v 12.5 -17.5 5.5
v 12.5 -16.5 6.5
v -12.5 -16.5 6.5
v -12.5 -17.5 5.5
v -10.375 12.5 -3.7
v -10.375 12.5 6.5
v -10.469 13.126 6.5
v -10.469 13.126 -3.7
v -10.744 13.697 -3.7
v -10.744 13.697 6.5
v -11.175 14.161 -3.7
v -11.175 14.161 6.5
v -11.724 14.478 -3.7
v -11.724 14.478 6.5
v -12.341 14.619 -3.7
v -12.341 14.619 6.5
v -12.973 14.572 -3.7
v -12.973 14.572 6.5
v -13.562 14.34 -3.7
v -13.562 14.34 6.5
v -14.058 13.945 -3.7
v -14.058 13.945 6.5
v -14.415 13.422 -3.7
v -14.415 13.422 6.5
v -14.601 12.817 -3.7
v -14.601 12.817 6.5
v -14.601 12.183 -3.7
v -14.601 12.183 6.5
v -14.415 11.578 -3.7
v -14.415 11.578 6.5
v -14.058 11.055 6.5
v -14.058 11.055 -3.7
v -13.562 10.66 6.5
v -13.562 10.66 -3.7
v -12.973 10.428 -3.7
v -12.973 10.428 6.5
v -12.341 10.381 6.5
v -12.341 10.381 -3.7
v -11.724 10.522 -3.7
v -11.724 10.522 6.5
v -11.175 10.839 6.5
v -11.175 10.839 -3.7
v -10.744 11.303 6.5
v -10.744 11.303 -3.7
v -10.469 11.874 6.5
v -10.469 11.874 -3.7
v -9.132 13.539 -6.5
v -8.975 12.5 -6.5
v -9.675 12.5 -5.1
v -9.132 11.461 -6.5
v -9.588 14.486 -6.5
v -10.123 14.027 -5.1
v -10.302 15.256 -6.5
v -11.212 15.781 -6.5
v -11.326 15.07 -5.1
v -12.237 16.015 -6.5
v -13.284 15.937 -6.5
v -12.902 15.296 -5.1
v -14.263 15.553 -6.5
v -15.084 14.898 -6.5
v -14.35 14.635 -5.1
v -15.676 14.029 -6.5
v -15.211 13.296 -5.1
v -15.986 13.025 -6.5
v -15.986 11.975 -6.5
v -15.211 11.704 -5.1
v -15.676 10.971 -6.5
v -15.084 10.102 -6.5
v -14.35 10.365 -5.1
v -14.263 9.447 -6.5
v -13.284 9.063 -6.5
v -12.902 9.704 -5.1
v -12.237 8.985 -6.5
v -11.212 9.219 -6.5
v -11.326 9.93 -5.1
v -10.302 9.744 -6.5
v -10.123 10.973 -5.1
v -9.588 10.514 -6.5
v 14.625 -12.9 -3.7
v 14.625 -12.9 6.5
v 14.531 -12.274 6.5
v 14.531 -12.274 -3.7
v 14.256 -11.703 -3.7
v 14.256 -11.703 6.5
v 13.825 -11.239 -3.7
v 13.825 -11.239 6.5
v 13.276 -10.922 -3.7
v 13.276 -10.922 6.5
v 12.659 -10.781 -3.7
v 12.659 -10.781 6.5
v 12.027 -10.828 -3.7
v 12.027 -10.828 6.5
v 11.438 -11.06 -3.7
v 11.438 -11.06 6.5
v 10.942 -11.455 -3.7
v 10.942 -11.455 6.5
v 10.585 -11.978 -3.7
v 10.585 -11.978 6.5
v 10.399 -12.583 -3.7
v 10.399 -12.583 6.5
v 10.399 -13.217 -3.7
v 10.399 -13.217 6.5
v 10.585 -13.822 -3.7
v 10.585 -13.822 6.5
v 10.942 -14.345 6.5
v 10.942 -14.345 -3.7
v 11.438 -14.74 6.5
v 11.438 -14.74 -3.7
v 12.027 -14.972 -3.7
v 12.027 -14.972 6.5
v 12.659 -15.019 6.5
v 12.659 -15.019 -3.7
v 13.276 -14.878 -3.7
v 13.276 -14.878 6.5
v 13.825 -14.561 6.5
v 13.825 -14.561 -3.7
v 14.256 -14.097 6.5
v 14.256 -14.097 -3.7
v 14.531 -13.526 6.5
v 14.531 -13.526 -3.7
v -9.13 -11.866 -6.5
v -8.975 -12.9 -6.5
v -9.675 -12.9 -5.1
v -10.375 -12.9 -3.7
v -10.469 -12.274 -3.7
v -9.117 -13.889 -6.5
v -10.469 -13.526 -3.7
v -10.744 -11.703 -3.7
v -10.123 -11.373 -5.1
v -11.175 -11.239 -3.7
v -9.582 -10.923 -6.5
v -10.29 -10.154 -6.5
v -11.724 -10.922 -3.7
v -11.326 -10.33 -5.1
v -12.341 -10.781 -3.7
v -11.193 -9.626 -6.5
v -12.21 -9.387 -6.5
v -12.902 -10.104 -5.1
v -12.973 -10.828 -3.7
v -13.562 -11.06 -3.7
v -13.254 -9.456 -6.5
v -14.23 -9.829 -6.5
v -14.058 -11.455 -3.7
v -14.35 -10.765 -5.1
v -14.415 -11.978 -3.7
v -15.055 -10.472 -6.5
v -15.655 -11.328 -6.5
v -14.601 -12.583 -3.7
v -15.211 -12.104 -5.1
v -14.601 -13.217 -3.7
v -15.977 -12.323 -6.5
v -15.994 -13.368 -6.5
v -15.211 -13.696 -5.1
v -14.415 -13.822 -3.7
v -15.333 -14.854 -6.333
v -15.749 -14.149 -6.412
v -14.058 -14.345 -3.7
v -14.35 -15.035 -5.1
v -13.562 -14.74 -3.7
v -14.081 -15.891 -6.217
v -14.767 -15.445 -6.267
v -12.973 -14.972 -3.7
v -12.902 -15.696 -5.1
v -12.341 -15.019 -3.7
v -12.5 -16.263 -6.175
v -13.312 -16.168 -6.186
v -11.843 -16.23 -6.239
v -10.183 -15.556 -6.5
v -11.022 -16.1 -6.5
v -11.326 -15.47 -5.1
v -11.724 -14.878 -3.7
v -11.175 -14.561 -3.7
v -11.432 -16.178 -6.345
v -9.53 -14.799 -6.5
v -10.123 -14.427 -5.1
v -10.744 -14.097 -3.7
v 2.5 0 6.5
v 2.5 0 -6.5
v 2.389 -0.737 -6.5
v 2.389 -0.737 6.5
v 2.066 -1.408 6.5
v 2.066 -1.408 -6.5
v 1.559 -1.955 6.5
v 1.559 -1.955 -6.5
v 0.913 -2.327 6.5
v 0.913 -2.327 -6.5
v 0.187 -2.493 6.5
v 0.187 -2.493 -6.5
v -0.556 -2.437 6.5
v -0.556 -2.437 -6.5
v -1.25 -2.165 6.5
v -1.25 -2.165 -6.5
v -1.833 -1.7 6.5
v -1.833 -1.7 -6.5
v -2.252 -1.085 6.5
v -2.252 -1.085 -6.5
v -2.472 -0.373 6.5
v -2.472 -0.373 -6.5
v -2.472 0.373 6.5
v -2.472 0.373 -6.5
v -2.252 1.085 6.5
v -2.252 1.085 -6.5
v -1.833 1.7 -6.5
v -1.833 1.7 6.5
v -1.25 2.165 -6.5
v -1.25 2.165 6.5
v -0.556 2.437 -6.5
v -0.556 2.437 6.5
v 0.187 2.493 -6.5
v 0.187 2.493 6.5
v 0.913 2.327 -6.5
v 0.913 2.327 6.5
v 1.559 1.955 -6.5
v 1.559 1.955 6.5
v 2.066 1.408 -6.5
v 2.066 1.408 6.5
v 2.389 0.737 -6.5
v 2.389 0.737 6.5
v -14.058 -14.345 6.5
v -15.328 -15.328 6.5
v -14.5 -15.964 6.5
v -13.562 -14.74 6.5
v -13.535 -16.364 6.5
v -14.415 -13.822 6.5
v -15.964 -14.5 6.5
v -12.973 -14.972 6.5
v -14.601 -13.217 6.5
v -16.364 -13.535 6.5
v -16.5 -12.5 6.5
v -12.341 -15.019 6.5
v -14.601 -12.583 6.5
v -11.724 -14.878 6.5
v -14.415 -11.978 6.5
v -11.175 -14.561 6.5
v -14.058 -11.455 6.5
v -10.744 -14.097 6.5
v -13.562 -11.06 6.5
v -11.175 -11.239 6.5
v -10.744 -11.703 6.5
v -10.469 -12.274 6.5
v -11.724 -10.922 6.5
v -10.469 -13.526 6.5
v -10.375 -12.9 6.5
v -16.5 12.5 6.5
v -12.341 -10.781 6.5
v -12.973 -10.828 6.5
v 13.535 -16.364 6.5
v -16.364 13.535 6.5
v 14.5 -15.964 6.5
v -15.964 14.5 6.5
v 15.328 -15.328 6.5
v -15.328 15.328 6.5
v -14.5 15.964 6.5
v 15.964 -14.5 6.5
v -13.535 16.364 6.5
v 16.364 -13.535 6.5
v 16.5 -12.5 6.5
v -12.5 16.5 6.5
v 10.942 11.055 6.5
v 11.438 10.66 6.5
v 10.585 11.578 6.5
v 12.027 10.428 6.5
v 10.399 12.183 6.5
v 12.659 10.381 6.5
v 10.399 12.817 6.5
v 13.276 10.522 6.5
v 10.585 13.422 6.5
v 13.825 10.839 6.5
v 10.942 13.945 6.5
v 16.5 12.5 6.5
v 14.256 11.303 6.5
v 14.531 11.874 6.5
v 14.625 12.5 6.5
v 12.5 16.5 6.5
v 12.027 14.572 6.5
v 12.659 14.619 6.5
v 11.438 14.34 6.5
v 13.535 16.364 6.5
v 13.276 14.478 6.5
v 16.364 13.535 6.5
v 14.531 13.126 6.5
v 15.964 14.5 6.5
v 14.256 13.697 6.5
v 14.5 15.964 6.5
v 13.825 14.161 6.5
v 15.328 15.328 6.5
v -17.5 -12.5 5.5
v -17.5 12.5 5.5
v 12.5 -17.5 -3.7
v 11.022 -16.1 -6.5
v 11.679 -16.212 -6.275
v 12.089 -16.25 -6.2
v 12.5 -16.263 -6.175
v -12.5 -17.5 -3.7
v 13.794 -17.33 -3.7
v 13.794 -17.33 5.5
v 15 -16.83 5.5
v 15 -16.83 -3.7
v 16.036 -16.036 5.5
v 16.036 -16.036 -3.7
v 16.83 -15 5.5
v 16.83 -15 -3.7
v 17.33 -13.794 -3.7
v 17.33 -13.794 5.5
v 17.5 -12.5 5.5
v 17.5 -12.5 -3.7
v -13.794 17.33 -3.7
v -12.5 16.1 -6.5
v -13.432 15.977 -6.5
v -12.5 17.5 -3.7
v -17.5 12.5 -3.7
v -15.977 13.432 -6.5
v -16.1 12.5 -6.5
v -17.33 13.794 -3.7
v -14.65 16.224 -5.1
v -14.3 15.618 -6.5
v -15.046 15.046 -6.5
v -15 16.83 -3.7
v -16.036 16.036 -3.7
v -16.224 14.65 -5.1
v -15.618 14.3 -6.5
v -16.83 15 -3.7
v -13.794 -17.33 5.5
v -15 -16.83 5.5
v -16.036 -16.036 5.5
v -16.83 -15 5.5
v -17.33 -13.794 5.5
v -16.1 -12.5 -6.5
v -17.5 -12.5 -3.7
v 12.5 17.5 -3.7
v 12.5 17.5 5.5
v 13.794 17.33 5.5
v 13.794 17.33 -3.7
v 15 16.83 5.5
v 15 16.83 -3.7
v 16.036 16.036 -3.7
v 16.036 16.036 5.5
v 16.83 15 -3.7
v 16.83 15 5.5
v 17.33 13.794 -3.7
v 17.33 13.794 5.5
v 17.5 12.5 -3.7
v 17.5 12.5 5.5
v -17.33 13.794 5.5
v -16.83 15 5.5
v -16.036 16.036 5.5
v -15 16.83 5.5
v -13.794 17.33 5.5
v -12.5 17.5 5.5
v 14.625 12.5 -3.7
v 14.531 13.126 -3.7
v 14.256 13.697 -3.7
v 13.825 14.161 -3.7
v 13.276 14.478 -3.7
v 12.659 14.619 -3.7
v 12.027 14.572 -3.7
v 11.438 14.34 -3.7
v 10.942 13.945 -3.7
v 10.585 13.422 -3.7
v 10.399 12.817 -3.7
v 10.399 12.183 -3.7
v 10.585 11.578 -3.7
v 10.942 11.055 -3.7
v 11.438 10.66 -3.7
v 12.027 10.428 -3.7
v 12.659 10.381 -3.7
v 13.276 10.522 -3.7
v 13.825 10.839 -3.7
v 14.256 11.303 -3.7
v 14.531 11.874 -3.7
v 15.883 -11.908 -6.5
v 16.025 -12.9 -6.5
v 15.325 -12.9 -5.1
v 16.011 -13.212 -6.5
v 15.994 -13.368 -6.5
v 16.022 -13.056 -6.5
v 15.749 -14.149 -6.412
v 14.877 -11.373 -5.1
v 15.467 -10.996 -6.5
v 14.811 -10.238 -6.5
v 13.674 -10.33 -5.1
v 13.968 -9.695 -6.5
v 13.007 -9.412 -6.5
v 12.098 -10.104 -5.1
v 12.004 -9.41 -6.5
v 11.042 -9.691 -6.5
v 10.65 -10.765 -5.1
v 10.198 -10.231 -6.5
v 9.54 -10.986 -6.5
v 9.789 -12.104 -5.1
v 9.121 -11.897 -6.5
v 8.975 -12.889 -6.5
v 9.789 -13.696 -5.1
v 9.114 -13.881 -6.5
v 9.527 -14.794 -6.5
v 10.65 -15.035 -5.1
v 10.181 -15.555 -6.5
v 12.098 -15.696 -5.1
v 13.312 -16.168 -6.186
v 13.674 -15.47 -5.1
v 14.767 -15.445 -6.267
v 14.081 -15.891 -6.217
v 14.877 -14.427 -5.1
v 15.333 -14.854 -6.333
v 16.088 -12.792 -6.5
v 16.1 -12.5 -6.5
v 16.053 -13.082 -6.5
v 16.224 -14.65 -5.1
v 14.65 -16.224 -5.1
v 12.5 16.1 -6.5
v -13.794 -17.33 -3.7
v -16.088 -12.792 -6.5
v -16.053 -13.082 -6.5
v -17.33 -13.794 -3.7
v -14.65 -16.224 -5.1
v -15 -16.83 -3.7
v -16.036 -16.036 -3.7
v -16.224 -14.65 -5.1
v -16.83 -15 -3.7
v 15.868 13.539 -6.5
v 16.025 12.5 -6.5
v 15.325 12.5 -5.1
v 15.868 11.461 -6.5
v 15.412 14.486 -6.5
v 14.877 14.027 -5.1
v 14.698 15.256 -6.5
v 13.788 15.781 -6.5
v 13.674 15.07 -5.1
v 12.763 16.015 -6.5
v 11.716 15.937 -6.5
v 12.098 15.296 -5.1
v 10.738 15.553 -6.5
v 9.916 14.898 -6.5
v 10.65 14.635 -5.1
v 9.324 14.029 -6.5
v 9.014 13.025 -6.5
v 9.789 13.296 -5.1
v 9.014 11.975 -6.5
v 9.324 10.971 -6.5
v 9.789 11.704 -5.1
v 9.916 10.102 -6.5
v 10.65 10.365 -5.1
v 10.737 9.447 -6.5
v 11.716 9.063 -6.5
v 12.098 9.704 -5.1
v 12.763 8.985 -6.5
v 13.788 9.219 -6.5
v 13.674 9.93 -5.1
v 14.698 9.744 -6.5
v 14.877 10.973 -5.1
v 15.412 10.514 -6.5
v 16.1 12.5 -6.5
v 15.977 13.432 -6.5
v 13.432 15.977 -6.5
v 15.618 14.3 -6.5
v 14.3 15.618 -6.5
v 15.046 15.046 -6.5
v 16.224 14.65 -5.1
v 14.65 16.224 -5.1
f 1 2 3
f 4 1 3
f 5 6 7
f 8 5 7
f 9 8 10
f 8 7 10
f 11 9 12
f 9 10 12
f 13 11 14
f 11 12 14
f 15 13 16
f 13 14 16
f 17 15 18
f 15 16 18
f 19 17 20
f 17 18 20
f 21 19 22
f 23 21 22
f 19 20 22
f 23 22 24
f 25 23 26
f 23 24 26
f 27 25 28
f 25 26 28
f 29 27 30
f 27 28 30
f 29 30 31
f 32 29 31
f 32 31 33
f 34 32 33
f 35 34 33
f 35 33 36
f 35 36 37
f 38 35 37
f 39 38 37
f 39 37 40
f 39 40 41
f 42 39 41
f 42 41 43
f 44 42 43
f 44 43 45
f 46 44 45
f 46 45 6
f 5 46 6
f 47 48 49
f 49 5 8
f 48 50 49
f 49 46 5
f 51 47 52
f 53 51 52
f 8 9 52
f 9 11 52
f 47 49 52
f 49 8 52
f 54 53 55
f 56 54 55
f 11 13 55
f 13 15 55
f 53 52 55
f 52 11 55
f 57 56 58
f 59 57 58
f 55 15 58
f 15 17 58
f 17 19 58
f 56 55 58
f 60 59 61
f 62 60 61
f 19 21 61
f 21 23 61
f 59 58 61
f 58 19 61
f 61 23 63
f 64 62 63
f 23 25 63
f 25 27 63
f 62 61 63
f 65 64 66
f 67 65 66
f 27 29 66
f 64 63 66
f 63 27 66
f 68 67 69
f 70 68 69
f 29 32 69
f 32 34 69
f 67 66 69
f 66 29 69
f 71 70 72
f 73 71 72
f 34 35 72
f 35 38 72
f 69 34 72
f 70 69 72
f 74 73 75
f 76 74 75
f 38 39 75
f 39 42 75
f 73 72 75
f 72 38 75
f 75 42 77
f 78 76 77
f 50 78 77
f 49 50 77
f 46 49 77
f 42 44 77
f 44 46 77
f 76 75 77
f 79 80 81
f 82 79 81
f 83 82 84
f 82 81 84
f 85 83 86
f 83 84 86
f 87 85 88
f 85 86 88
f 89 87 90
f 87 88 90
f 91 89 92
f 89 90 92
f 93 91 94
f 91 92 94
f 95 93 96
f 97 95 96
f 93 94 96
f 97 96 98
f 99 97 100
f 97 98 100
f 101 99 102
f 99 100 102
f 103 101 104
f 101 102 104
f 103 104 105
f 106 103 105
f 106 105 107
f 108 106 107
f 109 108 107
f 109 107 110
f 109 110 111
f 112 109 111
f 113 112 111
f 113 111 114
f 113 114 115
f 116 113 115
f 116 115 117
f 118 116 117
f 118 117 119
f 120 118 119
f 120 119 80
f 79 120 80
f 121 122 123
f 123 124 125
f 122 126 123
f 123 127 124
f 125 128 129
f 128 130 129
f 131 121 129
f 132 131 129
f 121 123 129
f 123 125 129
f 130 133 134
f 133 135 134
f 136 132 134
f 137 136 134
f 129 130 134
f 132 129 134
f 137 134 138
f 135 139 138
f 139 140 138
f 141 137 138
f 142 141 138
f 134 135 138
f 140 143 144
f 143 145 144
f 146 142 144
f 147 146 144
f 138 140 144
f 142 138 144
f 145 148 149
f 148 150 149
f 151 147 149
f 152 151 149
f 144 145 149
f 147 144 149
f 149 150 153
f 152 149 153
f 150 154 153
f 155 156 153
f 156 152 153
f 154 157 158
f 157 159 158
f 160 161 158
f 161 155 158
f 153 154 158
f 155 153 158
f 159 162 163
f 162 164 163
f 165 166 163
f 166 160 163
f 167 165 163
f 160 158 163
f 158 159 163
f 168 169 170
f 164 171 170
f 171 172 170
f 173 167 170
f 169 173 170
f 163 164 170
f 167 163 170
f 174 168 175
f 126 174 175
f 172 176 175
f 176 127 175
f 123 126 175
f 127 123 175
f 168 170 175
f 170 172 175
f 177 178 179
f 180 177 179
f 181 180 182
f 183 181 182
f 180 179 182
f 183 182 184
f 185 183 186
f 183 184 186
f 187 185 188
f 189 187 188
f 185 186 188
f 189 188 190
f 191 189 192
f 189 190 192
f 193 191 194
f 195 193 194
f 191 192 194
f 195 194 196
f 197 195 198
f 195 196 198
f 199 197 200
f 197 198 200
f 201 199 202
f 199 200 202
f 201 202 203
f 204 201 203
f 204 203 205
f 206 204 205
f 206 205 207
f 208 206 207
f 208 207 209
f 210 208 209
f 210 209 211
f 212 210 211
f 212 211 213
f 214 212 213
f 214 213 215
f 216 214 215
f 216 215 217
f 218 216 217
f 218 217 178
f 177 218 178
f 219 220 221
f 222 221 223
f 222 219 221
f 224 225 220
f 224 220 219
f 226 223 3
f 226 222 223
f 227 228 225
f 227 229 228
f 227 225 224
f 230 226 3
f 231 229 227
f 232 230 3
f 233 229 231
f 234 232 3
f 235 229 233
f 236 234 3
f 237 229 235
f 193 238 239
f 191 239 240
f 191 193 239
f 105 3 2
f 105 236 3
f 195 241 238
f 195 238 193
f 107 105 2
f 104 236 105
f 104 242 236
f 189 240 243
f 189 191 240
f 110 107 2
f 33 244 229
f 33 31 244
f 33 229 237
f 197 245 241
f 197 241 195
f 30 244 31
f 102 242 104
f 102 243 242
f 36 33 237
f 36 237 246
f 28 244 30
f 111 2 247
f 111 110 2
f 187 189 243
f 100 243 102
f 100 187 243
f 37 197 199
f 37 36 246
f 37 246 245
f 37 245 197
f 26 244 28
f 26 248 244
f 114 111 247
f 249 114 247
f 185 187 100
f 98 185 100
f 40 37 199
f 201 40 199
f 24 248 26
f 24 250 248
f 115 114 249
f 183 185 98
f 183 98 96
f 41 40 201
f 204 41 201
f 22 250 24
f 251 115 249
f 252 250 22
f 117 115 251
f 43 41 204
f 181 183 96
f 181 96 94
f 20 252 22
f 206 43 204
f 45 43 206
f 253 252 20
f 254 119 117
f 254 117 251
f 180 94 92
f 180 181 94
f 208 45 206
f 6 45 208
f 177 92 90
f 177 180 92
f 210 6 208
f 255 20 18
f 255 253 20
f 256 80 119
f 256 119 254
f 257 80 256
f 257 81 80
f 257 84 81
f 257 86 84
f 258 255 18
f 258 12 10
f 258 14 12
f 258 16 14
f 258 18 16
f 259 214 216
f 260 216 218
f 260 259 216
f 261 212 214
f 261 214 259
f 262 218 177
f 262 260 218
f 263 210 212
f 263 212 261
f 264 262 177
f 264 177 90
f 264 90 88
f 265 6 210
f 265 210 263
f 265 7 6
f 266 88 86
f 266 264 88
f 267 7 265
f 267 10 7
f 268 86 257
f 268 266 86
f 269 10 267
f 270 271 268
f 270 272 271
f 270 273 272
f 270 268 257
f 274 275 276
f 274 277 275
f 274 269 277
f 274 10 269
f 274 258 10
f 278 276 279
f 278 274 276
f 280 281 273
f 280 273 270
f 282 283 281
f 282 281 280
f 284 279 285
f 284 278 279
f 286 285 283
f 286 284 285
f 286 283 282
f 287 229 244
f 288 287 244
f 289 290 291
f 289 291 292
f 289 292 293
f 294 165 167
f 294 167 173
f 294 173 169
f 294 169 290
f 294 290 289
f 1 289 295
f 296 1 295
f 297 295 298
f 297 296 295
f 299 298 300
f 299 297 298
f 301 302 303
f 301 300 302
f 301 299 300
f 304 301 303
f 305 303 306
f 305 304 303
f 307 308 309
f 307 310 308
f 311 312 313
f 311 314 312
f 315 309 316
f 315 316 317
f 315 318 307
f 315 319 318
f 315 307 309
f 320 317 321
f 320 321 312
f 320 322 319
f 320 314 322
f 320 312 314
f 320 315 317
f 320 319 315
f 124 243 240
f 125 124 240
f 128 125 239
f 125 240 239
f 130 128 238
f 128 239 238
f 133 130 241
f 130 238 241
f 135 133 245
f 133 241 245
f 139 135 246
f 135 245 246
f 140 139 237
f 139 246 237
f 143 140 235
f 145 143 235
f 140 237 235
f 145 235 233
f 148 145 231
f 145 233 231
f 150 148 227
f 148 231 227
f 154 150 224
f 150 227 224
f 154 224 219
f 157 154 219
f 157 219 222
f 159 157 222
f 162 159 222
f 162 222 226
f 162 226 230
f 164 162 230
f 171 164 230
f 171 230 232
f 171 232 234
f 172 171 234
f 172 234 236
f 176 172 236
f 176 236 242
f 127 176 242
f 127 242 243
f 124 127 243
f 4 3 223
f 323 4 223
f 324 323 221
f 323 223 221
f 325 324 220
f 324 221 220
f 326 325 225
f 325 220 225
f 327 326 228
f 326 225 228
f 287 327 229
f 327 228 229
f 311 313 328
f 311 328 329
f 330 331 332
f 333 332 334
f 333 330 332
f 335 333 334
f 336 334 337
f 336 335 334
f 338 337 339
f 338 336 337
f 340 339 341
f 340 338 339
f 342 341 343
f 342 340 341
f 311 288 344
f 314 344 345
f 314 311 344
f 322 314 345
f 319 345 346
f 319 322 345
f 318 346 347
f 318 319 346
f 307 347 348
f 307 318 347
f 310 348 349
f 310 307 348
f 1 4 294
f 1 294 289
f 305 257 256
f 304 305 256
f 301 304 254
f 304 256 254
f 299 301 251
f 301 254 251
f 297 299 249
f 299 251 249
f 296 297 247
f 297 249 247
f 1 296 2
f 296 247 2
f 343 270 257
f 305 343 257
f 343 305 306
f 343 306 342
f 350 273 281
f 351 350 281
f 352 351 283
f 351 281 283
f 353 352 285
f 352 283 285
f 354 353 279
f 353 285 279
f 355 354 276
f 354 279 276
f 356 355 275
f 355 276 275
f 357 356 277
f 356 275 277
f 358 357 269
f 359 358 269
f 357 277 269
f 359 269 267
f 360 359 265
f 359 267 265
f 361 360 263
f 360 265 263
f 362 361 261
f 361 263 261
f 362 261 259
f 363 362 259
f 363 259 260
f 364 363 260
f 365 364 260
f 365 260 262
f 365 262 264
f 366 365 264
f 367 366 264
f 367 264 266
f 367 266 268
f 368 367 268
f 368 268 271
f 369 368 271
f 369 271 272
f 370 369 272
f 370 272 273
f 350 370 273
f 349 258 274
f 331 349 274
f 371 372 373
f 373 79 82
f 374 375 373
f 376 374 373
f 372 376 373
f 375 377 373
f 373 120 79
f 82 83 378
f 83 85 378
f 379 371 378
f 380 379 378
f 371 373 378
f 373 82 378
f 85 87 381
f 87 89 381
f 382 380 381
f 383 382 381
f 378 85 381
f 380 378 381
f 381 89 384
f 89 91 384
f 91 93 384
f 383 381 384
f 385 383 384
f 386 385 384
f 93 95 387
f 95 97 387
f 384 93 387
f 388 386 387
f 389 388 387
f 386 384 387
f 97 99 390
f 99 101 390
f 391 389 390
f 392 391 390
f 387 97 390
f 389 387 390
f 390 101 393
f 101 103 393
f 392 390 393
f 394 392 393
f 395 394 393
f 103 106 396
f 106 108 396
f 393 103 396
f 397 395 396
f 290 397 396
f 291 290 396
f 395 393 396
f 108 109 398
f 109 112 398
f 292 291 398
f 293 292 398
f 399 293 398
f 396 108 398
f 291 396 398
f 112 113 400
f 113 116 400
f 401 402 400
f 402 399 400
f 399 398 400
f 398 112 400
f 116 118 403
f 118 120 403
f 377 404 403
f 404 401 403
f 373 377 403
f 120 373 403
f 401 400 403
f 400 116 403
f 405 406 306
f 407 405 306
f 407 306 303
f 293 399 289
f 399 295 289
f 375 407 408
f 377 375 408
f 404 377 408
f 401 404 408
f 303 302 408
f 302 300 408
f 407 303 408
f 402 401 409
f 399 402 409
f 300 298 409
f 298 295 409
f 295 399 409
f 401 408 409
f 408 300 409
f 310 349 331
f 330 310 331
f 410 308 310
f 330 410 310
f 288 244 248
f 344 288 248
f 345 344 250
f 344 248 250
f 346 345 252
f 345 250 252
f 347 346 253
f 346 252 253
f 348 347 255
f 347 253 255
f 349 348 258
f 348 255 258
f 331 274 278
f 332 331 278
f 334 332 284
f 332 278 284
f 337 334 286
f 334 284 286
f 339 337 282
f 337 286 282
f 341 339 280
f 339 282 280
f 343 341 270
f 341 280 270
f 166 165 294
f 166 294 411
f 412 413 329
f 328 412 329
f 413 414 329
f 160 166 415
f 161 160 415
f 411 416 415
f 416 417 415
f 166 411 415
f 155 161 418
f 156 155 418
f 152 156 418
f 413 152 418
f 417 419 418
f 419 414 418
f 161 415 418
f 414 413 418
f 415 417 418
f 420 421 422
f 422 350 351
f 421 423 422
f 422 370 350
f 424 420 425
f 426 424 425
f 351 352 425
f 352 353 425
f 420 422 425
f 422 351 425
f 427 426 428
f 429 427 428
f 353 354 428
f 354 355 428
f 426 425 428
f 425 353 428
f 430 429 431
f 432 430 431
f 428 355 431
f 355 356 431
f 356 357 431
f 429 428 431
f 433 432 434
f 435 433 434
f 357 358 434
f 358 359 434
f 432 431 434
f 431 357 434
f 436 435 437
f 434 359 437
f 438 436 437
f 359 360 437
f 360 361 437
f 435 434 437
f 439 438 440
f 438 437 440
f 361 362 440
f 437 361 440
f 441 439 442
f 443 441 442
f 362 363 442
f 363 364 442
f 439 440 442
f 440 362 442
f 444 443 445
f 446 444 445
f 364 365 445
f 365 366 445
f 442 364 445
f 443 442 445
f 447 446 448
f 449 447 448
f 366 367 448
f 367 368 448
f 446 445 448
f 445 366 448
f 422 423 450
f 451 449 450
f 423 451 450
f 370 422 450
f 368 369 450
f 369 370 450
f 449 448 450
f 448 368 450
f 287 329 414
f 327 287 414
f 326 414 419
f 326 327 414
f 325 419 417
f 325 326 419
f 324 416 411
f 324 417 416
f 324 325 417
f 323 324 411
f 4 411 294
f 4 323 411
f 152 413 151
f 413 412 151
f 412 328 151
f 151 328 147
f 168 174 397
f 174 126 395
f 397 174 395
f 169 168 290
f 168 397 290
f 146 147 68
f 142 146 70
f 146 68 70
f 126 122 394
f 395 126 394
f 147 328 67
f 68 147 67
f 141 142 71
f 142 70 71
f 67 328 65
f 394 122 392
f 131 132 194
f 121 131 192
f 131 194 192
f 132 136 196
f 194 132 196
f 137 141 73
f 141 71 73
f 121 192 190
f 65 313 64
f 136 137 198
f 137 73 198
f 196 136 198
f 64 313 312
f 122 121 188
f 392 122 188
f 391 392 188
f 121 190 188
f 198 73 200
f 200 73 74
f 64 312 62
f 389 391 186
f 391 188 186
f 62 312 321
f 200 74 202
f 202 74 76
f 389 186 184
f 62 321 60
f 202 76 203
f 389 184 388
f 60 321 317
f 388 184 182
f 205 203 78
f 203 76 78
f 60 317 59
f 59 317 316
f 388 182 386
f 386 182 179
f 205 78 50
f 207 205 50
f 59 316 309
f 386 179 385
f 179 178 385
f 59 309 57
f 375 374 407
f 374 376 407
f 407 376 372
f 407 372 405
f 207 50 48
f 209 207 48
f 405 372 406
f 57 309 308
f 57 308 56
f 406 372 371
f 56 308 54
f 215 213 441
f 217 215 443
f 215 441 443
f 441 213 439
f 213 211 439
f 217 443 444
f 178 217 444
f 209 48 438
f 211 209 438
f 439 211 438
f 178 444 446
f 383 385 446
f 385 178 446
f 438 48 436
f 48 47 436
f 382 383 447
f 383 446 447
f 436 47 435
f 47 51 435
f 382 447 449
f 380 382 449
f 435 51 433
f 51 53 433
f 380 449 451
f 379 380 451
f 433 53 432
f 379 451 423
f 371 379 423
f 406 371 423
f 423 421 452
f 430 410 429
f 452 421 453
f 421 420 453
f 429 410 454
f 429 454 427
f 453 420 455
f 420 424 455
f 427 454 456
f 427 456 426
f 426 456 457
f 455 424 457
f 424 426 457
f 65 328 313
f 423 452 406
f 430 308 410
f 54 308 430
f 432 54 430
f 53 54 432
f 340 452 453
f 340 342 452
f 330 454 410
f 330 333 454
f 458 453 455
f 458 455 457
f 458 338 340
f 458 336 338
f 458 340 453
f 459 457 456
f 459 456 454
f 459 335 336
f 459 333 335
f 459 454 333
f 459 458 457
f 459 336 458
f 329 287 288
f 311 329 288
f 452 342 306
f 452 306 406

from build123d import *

# Parameters (mm, degrees)
F0_W         = 35
F0_H         = 35
F1_DEPTH     = 6.5
F2_R         = 2.125
F3_DEPTH     = 13.001
F4_R         = 5
F5_T1_DEPTH  = 25
F5_T3_DEPTH  = 25
F5_T12_ANGLE = 90
F5_T14_ANGLE = 90
F5_T16_ANGLE = 90
F5_T18_ANGLE = 90
F6_R         = 2.5
F7_DEPTH     = 13.001
F8_SIZE      = 1


# Not quite as in the source:
# - a fillet or chamfer that OpenCascade refuses, or shapes differently, is made with other operations: its cross-section is extruded or revolved along the edge and cut away or added


with BuildPart() as f1:
    # F0 (on Top) → F1 (new body, symmetric)
    with BuildSketch(Plane.XY):
        Rectangle(F0_W, F0_H)
    extrude(amount=F1_DEPTH, both=True)

    # F2 (on face) → F3 (cut, through all)
    with BuildSketch(Plane.XY.offset(6.5)):
        with Locations((-12.5, -12.9)):
            Circle(F2_R)
        with Locations((-12.5, 12.5)):
            Circle(F2_R)
        with Locations((12.5, 12.5)):
            Circle(F2_R)
        with Locations((12.5, -12.9)):
            Circle(F2_R)
    extrude(amount=-F3_DEPTH, mode=Mode.SUBTRACT)

    # F4
    f4_edges = [f1.edges().sort_by_distance(p)[0] for p in [
        (-17.5, 17.5, 0),
        (17.5, 17.5, 0),
        (17.5, -17.5, 0),
        (-17.5, -17.5, 0),
    ]]
    fillet(f4_edges, radius=F4_R)

    # F5: chamfer of 1.4 x 2.8 on 12 edges, made by hand

    # F5_s2 → F5_t1 (cut)
    with BuildSketch(Plane.XZ.offset(-12.5)):
        Polygon((17.5, -3.7), (16.1, -6.5), (17.5, -6.5), align=None)
        Polygon((-16.1, -6.5), (-17.5, -3.7), (-17.5, -6.5), align=None)
    extrude(amount=F5_T1_DEPTH, mode=Mode.SUBTRACT)

    # F5_s4 → F5_t3 (cut)
    with BuildSketch(Plane.YZ.offset(-12.5)):
        Polygon((-16.1, -6.5), (-17.5, -3.7), (-17.5, -6.5), align=None)
        Polygon((16.1, -6.5), (17.5, -3.7), (17.5, -6.5), align=None)
    extrude(amount=F5_T3_DEPTH, mode=Mode.SUBTRACT)

    # F5_s5 → F5_t6 (revolve, cut)
    with BuildSketch(Plane.XZ.offset(12.9)):
        Polygon((-8.975, -6.5), (-10.375, -3.7), (-10.375, -6.5), align=None)
    revolve(axis=Axis((-12.5, -12.9, -6.5), (0, 0, 1)), mode=Mode.SUBTRACT)

    # F5_s7 → F5_t8 (revolve, cut)
    with BuildSketch(Plane.XZ.offset(12.9)):
        Polygon((16.025, -6.5), (14.625, -3.7), (14.625, -6.5), align=None)
    revolve(axis=Axis((12.5, -12.9, -6.5), (0, 0, 1)), mode=Mode.SUBTRACT)

    # F5_s9 → F5_t10 (revolve, cut)
    with BuildSketch(Plane.XZ.offset(-12.5)):
        Polygon((16.025, -6.5), (14.625, -3.7), (14.625, -6.5), align=None)
    revolve(axis=Axis((12.5, 12.5, -6.5), (0, 0, 1)), mode=Mode.SUBTRACT)

    # F5_s11 → F5_t12 (revolve, cut)
    with BuildSketch(Plane.XZ.offset(12.5)):
        Polygon((16.1, -6.5), (17.5, -3.7), (17.5, -6.5), align=None)
    revolve(axis=Axis((12.5, -12.5, -6.5), (0, 0, -1)), revolution_arc=F5_T12_ANGLE, mode=Mode.SUBTRACT)

    # F5_s13 → F5_t14 (revolve, cut)
    with BuildSketch(Plane.XZ.offset(-12.5)):
        Polygon((16.1, -6.5), (17.5, -3.7), (17.5, -6.5), align=None)
    revolve(axis=Axis((12.5, 12.5, -6.5), (0, 0, 1)), revolution_arc=F5_T14_ANGLE, mode=Mode.SUBTRACT)

    # F5_s15 → F5_t16 (revolve, cut)
    with BuildSketch(Plane.YZ.offset(-12.5)):
        Polygon((-16.1, -6.5), (-17.5, -3.7), (-17.5, -6.5), align=None)
    revolve(axis=Axis((-12.5, -12.5, -6.5), (0, 0, -1)), revolution_arc=F5_T16_ANGLE, mode=Mode.SUBTRACT)

    # F5_s17 → F5_t18 (revolve, cut)
    with BuildSketch(Plane.YZ.offset(-12.5)):
        Polygon((16.1, -6.5), (17.5, -3.7), (17.5, -6.5), align=None)
    revolve(axis=Axis((-12.5, 12.5, -6.5), (0, 0, 1)), revolution_arc=F5_T18_ANGLE, mode=Mode.SUBTRACT)

    # F5_s19 → F5_t20 (revolve, cut)
    with BuildSketch(Plane.XZ.offset(-12.5)):
        Polygon((-8.975, -6.5), (-10.375, -3.7), (-10.375, -6.5), align=None)
    revolve(axis=Axis((-12.5, 12.5, -6.5), (0, 0, 1)), mode=Mode.SUBTRACT)

    # F6 (on face) → F7 (cut, through all)
    with BuildSketch(Plane(origin=(0, 0, -6.5), x_dir=(1, 0, 0), z_dir=(0, 0, -1))):
        Circle(F6_R)
    extrude(amount=-F7_DEPTH, mode=Mode.SUBTRACT)

    # F8
    f8_edges = [f1.edges().sort_by_distance(p)[0] for p in [
        (-17.5, 0, 6.5),
    ]]
    chamfer(f8_edges, length=F8_SIZE)


solid = f1.part
